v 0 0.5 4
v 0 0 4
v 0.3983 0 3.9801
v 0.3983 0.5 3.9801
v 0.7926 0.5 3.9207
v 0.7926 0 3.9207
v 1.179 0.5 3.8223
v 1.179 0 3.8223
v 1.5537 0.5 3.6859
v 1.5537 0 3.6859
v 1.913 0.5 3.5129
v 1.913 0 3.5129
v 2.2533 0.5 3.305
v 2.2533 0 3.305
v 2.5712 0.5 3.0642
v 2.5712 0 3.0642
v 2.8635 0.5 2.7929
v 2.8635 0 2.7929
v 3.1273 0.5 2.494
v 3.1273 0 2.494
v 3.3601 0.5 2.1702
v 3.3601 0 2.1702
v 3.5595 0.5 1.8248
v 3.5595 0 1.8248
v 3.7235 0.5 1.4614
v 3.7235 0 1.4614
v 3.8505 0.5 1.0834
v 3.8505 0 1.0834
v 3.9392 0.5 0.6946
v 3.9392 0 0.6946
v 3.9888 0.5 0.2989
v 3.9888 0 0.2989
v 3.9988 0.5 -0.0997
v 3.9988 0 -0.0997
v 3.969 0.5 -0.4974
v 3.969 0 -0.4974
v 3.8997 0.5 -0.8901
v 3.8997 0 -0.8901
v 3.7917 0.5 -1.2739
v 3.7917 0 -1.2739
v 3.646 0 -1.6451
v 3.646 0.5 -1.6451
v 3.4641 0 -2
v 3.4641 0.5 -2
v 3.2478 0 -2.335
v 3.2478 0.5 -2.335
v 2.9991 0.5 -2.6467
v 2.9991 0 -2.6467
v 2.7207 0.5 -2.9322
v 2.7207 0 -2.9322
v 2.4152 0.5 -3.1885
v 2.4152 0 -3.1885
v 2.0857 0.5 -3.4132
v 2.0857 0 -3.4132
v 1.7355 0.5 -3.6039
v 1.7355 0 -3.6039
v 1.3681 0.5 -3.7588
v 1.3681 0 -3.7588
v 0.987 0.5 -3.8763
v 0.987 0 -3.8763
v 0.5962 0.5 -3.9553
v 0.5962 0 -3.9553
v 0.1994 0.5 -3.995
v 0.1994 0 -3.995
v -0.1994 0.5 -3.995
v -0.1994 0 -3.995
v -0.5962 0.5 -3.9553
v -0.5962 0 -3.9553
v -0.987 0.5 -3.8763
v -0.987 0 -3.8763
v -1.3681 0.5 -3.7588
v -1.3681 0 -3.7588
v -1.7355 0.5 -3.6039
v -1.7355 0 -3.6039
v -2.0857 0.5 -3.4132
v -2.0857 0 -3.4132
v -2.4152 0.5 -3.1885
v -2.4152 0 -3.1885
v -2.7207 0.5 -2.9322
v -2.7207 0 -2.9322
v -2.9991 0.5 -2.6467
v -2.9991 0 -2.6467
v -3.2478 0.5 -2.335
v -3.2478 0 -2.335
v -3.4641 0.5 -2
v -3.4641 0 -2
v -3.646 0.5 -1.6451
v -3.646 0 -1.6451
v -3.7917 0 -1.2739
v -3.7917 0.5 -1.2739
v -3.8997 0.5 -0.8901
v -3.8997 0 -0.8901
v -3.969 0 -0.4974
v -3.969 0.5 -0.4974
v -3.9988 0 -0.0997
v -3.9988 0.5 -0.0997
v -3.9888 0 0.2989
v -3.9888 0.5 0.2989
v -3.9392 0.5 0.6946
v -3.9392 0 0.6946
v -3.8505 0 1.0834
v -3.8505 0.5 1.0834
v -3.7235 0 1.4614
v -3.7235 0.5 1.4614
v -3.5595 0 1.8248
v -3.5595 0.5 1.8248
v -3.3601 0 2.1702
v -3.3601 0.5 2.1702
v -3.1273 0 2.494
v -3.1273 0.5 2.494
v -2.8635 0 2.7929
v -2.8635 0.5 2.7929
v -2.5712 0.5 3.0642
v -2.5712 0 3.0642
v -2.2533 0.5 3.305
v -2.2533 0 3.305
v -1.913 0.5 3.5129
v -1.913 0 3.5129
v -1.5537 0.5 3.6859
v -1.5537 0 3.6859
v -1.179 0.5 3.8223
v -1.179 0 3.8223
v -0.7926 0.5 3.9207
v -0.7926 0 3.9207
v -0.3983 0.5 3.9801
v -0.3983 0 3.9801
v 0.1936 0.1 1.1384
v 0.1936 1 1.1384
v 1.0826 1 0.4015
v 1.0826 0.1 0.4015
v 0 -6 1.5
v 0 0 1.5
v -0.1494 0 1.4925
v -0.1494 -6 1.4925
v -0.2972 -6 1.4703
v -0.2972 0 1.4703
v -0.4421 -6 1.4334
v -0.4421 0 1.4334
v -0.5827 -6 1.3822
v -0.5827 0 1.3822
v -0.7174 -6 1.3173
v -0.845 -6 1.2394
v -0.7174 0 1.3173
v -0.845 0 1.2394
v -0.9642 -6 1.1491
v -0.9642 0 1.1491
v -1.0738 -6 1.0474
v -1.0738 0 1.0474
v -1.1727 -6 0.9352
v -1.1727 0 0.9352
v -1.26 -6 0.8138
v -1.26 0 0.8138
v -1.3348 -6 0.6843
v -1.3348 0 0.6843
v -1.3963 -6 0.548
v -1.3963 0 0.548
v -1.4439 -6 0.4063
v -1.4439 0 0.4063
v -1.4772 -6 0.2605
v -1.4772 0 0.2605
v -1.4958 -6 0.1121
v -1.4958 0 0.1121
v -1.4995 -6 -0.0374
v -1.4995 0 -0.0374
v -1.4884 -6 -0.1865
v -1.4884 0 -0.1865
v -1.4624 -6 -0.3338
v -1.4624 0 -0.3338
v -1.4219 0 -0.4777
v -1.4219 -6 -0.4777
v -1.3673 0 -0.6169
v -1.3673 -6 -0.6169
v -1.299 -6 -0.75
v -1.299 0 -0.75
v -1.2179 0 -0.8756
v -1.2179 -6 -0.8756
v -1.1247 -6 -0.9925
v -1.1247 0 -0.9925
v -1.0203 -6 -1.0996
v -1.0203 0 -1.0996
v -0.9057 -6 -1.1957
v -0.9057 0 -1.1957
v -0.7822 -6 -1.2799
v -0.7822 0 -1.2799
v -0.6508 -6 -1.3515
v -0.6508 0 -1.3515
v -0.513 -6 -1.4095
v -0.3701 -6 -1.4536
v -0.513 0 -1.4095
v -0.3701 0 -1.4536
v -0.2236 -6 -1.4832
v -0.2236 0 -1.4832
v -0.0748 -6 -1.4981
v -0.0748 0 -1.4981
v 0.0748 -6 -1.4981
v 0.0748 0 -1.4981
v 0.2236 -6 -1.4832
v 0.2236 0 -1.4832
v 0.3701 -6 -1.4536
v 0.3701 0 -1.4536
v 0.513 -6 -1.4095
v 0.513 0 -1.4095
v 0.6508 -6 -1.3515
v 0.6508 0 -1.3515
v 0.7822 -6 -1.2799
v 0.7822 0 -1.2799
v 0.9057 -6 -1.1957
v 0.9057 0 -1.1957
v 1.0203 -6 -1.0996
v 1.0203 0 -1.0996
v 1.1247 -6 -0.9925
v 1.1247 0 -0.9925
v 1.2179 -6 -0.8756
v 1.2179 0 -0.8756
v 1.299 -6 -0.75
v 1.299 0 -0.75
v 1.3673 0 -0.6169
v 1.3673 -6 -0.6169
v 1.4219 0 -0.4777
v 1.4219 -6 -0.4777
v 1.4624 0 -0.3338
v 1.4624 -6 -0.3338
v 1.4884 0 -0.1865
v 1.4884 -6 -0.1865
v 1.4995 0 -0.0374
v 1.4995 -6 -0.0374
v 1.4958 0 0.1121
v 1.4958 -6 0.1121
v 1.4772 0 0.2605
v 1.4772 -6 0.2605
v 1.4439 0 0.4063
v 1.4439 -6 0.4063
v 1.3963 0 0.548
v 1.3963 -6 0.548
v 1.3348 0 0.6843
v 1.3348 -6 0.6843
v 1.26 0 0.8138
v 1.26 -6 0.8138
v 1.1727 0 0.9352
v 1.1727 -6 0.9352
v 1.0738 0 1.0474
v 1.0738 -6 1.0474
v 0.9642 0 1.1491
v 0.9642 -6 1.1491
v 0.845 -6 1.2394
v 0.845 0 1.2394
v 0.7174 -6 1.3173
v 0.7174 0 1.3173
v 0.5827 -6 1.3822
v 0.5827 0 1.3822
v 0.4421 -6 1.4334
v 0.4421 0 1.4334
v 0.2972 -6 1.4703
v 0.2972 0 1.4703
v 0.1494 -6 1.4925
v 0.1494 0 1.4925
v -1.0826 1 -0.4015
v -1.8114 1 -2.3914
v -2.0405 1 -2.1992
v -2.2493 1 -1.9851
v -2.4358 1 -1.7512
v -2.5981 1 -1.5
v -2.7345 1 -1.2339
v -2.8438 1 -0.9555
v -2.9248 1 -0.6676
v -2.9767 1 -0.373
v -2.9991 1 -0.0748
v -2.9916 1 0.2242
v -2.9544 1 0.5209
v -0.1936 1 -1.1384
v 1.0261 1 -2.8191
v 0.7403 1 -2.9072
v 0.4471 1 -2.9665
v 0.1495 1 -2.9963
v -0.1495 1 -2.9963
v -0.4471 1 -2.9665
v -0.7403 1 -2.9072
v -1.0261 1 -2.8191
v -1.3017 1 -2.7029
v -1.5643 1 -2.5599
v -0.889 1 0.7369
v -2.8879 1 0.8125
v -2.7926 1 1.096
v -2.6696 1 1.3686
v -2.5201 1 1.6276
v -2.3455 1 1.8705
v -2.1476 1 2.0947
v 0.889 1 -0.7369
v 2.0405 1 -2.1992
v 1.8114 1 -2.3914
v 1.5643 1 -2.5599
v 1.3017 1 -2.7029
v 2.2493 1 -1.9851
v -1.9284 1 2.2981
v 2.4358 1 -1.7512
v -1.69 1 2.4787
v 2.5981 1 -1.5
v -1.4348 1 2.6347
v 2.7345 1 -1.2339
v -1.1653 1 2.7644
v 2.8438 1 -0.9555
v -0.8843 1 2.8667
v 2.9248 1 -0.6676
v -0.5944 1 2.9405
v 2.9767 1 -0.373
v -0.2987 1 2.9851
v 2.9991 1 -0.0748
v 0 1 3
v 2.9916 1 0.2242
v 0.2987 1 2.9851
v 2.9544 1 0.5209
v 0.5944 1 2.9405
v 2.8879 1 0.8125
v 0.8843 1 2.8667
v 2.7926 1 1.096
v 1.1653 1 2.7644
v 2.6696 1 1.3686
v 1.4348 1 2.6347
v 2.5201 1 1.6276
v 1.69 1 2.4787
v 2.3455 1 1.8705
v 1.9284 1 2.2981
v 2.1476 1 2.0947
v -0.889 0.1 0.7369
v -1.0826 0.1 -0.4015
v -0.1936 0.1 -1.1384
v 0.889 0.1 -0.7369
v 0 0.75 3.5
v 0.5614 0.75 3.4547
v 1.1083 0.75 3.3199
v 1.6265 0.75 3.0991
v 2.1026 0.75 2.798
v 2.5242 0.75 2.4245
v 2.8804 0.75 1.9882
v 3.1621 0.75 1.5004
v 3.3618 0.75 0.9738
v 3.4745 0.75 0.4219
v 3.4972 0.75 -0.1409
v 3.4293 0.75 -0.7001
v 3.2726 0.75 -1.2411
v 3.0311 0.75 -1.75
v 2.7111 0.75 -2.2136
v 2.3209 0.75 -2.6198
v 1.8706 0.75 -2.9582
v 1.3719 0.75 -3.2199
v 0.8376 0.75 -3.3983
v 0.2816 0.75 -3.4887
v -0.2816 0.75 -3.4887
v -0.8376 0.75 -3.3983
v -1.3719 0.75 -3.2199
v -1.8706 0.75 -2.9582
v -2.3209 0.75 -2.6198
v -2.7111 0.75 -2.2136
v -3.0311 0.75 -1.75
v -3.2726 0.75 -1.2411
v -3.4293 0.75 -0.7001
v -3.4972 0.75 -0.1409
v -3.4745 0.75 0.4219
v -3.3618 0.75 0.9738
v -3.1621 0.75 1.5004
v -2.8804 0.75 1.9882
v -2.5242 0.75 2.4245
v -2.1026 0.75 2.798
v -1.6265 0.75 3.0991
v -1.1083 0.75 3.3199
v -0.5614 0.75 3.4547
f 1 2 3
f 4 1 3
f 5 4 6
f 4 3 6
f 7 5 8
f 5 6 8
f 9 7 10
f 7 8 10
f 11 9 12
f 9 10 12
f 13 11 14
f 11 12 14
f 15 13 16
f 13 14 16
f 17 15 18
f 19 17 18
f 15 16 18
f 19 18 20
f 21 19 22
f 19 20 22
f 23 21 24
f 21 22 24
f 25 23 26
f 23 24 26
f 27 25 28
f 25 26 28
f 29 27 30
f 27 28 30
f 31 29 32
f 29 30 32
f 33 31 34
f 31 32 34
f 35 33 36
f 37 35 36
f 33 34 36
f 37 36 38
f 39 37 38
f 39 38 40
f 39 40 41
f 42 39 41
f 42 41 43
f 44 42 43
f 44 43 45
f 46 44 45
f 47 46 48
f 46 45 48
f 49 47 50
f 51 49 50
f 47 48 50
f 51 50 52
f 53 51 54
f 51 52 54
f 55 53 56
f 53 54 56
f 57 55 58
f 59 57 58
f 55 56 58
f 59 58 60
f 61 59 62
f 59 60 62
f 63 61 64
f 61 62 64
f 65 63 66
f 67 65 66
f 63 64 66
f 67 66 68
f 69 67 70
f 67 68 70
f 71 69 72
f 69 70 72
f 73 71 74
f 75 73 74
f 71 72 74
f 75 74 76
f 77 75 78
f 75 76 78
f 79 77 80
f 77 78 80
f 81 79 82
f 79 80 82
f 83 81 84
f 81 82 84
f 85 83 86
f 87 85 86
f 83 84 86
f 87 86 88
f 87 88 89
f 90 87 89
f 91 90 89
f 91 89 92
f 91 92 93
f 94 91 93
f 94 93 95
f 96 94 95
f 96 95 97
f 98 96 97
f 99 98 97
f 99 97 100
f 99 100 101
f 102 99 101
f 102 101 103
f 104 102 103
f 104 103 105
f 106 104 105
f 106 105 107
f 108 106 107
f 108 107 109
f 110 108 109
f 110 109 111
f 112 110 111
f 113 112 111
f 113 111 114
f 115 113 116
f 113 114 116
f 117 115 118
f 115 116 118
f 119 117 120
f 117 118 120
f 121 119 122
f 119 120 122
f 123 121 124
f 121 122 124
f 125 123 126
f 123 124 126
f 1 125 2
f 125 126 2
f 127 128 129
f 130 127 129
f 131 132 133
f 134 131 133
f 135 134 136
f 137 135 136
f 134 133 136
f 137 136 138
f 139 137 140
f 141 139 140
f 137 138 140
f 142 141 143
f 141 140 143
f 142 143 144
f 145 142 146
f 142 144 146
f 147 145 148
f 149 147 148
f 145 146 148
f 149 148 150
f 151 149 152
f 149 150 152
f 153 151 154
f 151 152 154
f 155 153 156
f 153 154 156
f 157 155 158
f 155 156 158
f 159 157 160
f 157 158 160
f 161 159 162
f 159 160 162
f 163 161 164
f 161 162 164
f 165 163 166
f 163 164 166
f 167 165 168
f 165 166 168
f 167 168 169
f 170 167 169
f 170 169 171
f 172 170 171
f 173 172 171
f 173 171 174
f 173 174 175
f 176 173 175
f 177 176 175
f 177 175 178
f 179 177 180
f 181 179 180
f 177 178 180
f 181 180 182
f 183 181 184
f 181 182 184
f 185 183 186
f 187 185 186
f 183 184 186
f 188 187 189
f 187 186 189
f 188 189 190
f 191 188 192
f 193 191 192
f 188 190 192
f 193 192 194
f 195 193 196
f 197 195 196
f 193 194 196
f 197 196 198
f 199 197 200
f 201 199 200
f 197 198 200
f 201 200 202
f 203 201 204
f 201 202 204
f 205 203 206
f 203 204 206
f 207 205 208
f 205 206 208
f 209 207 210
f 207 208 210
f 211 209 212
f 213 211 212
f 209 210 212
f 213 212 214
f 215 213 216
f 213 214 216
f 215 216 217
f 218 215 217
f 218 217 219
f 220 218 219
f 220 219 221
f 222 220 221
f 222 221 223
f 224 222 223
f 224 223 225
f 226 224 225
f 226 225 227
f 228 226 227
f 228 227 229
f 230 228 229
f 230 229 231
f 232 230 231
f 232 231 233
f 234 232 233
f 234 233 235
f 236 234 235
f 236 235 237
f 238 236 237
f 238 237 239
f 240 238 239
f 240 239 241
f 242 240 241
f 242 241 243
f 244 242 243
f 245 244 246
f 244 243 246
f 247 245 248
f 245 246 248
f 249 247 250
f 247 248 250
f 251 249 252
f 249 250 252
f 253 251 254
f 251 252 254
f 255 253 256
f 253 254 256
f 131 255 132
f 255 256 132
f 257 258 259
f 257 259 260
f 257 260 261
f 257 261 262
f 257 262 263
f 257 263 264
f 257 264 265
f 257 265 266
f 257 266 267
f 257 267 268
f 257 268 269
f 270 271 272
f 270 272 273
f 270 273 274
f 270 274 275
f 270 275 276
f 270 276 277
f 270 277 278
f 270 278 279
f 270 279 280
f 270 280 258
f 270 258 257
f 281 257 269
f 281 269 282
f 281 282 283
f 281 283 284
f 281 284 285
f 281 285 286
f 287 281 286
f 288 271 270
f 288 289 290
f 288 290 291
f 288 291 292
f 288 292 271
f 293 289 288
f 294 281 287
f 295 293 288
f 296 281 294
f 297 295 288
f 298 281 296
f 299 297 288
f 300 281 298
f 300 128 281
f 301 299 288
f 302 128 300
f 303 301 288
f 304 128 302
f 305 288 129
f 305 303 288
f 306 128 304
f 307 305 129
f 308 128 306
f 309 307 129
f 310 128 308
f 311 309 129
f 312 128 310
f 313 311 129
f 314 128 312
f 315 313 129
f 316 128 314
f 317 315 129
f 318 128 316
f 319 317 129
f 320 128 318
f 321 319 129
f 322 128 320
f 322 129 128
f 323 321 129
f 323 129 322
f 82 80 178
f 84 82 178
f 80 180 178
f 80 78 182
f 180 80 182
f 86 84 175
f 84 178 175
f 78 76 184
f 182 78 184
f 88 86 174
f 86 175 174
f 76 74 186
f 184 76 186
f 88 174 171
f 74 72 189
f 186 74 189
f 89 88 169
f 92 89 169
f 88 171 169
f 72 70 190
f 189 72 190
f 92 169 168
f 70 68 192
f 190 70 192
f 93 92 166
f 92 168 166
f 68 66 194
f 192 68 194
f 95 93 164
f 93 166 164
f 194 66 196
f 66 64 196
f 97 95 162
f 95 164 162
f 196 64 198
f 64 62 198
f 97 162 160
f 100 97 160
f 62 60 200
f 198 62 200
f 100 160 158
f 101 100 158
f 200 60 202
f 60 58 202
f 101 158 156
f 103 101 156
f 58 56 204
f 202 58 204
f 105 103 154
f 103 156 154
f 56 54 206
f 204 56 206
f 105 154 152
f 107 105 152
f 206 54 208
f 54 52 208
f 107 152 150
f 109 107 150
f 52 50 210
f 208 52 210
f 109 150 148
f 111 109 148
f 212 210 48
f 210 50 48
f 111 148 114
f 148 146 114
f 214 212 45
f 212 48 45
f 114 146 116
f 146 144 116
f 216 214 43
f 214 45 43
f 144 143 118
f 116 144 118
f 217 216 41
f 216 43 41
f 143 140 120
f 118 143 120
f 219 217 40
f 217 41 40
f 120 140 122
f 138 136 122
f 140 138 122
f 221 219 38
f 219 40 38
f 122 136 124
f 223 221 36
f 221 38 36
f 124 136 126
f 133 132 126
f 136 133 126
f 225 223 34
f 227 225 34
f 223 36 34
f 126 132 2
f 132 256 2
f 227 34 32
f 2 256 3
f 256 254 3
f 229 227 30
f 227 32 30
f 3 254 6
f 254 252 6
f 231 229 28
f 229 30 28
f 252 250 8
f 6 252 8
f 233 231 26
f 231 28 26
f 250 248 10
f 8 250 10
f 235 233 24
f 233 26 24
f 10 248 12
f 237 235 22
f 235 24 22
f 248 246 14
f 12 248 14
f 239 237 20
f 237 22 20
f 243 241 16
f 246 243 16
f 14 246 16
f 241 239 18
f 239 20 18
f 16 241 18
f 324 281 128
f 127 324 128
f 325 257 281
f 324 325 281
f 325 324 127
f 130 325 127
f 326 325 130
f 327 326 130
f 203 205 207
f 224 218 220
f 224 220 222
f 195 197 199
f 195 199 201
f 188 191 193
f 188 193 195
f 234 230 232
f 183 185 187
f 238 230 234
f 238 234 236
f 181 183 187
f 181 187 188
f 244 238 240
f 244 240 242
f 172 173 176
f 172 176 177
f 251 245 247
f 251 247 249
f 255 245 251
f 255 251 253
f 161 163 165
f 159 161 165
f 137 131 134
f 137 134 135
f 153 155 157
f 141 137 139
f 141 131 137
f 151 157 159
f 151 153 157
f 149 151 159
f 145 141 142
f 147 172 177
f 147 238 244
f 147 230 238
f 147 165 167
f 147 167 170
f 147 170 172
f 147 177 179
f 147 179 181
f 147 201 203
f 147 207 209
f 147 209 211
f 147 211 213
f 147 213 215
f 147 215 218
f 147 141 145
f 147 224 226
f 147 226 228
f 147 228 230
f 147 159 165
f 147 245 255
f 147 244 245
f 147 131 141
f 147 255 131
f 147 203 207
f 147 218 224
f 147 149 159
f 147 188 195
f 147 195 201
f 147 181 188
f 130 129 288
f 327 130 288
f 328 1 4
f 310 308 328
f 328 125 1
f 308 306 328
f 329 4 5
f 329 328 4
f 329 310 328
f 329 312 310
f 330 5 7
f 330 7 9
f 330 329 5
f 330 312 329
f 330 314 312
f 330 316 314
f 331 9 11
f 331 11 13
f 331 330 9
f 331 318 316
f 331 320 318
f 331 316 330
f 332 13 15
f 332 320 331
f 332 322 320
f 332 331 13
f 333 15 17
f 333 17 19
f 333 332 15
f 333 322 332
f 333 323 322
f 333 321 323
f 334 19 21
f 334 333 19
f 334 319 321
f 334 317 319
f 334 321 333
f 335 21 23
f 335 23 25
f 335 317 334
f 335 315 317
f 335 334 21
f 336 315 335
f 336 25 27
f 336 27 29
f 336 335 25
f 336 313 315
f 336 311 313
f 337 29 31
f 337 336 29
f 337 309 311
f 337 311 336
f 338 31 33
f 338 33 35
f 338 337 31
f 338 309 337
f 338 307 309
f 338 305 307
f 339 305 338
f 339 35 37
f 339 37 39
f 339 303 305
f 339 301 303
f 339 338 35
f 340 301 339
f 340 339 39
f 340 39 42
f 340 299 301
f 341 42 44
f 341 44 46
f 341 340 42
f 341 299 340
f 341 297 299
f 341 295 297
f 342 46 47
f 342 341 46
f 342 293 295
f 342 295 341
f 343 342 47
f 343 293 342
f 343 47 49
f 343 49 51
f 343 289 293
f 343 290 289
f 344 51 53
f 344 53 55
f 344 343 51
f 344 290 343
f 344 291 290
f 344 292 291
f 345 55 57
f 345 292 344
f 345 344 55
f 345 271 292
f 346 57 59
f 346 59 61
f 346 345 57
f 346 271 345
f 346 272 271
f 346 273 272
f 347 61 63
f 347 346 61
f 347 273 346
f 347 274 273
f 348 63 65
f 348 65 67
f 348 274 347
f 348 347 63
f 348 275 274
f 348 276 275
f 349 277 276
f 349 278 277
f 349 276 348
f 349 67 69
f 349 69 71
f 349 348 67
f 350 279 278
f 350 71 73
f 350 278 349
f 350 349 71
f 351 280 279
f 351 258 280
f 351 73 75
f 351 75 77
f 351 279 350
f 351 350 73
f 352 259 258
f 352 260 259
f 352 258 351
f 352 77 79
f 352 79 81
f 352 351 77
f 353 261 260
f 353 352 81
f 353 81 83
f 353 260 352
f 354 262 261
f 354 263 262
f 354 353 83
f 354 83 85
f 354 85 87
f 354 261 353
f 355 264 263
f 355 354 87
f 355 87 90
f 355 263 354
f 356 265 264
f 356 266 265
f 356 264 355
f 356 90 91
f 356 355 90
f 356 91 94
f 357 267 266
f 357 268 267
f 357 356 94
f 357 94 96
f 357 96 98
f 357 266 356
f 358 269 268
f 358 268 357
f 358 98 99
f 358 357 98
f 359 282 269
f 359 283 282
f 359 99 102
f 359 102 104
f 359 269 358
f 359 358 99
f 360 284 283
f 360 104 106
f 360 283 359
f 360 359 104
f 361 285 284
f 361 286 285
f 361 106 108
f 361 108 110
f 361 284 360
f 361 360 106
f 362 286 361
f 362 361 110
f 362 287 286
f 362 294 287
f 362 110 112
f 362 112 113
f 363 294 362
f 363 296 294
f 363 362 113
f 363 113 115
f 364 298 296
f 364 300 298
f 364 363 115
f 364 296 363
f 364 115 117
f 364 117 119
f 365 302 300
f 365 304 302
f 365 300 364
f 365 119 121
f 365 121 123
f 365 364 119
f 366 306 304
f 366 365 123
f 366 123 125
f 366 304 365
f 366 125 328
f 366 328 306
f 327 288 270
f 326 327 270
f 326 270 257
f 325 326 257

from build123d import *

# Parameters (mm, degrees)
SKETCH1_R           = 4
BOSS_EXTRUDE1_DEPTH = 1
CHAMFER1_SIZE       = 0.5
CHAMFER1_SIZE2      = 1
CUT_EXTRUDE1_DEPTH  = 0.9
SKETCH3_R           = 1.5
BOSS_EXTRUDE2_DEPTH = 6


with BuildPart() as part:
    # Sketch1 → Boss-Extrude1 (new body)
    with BuildSketch(Plane(origin=(0, 0, 0), x_dir=(1, 0, 0), z_dir=(0, 1, 0))):
        with Locations(Location((0, 0, 0), (0, 0, 270))):
            Circle(SKETCH1_R)
    extrude(amount=BOSS_EXTRUDE1_DEPTH)

    # Chamfer1
    chamfer1_edges = [part.edges().sort_by_distance(p)[0] for p in [
        (0, 1, -4),
    ]]
    chamfer1_side = [part.faces().sort_by_distance(p)[0] for p in [
        (0, 0.5, -4),
    ]]
    chamfer(chamfer1_edges, length=CHAMFER1_SIZE, length2=CHAMFER1_SIZE2, reference=chamfer1_side[0])

    # Sketch2 → Cut-Extrude1 (cut)
    with BuildSketch(Plane(origin=(0, 1, 0), x_dir=(1, 0, 0), z_dir=(0, 1, 0))):
        Polygon((0.88903539, 0.736851009), (-0.193613998, 1.138352737), (-1.082649387, 0.401501728), (-0.88903539, -0.736851009), (0.193613998, -1.138352737), (1.082649387, -0.401501728), align=None)
    extrude(amount=-CUT_EXTRUDE1_DEPTH, mode=Mode.SUBTRACT)

    # Sketch3 → Boss-Extrude2 (add)
    with BuildSketch(Plane.XZ):
        with Locations(Location((0, 0, 0), (0, 0, 90))):
            Circle(SKETCH3_R)
    extrude(amount=BOSS_EXTRUDE2_DEPTH)


solid = part.part
